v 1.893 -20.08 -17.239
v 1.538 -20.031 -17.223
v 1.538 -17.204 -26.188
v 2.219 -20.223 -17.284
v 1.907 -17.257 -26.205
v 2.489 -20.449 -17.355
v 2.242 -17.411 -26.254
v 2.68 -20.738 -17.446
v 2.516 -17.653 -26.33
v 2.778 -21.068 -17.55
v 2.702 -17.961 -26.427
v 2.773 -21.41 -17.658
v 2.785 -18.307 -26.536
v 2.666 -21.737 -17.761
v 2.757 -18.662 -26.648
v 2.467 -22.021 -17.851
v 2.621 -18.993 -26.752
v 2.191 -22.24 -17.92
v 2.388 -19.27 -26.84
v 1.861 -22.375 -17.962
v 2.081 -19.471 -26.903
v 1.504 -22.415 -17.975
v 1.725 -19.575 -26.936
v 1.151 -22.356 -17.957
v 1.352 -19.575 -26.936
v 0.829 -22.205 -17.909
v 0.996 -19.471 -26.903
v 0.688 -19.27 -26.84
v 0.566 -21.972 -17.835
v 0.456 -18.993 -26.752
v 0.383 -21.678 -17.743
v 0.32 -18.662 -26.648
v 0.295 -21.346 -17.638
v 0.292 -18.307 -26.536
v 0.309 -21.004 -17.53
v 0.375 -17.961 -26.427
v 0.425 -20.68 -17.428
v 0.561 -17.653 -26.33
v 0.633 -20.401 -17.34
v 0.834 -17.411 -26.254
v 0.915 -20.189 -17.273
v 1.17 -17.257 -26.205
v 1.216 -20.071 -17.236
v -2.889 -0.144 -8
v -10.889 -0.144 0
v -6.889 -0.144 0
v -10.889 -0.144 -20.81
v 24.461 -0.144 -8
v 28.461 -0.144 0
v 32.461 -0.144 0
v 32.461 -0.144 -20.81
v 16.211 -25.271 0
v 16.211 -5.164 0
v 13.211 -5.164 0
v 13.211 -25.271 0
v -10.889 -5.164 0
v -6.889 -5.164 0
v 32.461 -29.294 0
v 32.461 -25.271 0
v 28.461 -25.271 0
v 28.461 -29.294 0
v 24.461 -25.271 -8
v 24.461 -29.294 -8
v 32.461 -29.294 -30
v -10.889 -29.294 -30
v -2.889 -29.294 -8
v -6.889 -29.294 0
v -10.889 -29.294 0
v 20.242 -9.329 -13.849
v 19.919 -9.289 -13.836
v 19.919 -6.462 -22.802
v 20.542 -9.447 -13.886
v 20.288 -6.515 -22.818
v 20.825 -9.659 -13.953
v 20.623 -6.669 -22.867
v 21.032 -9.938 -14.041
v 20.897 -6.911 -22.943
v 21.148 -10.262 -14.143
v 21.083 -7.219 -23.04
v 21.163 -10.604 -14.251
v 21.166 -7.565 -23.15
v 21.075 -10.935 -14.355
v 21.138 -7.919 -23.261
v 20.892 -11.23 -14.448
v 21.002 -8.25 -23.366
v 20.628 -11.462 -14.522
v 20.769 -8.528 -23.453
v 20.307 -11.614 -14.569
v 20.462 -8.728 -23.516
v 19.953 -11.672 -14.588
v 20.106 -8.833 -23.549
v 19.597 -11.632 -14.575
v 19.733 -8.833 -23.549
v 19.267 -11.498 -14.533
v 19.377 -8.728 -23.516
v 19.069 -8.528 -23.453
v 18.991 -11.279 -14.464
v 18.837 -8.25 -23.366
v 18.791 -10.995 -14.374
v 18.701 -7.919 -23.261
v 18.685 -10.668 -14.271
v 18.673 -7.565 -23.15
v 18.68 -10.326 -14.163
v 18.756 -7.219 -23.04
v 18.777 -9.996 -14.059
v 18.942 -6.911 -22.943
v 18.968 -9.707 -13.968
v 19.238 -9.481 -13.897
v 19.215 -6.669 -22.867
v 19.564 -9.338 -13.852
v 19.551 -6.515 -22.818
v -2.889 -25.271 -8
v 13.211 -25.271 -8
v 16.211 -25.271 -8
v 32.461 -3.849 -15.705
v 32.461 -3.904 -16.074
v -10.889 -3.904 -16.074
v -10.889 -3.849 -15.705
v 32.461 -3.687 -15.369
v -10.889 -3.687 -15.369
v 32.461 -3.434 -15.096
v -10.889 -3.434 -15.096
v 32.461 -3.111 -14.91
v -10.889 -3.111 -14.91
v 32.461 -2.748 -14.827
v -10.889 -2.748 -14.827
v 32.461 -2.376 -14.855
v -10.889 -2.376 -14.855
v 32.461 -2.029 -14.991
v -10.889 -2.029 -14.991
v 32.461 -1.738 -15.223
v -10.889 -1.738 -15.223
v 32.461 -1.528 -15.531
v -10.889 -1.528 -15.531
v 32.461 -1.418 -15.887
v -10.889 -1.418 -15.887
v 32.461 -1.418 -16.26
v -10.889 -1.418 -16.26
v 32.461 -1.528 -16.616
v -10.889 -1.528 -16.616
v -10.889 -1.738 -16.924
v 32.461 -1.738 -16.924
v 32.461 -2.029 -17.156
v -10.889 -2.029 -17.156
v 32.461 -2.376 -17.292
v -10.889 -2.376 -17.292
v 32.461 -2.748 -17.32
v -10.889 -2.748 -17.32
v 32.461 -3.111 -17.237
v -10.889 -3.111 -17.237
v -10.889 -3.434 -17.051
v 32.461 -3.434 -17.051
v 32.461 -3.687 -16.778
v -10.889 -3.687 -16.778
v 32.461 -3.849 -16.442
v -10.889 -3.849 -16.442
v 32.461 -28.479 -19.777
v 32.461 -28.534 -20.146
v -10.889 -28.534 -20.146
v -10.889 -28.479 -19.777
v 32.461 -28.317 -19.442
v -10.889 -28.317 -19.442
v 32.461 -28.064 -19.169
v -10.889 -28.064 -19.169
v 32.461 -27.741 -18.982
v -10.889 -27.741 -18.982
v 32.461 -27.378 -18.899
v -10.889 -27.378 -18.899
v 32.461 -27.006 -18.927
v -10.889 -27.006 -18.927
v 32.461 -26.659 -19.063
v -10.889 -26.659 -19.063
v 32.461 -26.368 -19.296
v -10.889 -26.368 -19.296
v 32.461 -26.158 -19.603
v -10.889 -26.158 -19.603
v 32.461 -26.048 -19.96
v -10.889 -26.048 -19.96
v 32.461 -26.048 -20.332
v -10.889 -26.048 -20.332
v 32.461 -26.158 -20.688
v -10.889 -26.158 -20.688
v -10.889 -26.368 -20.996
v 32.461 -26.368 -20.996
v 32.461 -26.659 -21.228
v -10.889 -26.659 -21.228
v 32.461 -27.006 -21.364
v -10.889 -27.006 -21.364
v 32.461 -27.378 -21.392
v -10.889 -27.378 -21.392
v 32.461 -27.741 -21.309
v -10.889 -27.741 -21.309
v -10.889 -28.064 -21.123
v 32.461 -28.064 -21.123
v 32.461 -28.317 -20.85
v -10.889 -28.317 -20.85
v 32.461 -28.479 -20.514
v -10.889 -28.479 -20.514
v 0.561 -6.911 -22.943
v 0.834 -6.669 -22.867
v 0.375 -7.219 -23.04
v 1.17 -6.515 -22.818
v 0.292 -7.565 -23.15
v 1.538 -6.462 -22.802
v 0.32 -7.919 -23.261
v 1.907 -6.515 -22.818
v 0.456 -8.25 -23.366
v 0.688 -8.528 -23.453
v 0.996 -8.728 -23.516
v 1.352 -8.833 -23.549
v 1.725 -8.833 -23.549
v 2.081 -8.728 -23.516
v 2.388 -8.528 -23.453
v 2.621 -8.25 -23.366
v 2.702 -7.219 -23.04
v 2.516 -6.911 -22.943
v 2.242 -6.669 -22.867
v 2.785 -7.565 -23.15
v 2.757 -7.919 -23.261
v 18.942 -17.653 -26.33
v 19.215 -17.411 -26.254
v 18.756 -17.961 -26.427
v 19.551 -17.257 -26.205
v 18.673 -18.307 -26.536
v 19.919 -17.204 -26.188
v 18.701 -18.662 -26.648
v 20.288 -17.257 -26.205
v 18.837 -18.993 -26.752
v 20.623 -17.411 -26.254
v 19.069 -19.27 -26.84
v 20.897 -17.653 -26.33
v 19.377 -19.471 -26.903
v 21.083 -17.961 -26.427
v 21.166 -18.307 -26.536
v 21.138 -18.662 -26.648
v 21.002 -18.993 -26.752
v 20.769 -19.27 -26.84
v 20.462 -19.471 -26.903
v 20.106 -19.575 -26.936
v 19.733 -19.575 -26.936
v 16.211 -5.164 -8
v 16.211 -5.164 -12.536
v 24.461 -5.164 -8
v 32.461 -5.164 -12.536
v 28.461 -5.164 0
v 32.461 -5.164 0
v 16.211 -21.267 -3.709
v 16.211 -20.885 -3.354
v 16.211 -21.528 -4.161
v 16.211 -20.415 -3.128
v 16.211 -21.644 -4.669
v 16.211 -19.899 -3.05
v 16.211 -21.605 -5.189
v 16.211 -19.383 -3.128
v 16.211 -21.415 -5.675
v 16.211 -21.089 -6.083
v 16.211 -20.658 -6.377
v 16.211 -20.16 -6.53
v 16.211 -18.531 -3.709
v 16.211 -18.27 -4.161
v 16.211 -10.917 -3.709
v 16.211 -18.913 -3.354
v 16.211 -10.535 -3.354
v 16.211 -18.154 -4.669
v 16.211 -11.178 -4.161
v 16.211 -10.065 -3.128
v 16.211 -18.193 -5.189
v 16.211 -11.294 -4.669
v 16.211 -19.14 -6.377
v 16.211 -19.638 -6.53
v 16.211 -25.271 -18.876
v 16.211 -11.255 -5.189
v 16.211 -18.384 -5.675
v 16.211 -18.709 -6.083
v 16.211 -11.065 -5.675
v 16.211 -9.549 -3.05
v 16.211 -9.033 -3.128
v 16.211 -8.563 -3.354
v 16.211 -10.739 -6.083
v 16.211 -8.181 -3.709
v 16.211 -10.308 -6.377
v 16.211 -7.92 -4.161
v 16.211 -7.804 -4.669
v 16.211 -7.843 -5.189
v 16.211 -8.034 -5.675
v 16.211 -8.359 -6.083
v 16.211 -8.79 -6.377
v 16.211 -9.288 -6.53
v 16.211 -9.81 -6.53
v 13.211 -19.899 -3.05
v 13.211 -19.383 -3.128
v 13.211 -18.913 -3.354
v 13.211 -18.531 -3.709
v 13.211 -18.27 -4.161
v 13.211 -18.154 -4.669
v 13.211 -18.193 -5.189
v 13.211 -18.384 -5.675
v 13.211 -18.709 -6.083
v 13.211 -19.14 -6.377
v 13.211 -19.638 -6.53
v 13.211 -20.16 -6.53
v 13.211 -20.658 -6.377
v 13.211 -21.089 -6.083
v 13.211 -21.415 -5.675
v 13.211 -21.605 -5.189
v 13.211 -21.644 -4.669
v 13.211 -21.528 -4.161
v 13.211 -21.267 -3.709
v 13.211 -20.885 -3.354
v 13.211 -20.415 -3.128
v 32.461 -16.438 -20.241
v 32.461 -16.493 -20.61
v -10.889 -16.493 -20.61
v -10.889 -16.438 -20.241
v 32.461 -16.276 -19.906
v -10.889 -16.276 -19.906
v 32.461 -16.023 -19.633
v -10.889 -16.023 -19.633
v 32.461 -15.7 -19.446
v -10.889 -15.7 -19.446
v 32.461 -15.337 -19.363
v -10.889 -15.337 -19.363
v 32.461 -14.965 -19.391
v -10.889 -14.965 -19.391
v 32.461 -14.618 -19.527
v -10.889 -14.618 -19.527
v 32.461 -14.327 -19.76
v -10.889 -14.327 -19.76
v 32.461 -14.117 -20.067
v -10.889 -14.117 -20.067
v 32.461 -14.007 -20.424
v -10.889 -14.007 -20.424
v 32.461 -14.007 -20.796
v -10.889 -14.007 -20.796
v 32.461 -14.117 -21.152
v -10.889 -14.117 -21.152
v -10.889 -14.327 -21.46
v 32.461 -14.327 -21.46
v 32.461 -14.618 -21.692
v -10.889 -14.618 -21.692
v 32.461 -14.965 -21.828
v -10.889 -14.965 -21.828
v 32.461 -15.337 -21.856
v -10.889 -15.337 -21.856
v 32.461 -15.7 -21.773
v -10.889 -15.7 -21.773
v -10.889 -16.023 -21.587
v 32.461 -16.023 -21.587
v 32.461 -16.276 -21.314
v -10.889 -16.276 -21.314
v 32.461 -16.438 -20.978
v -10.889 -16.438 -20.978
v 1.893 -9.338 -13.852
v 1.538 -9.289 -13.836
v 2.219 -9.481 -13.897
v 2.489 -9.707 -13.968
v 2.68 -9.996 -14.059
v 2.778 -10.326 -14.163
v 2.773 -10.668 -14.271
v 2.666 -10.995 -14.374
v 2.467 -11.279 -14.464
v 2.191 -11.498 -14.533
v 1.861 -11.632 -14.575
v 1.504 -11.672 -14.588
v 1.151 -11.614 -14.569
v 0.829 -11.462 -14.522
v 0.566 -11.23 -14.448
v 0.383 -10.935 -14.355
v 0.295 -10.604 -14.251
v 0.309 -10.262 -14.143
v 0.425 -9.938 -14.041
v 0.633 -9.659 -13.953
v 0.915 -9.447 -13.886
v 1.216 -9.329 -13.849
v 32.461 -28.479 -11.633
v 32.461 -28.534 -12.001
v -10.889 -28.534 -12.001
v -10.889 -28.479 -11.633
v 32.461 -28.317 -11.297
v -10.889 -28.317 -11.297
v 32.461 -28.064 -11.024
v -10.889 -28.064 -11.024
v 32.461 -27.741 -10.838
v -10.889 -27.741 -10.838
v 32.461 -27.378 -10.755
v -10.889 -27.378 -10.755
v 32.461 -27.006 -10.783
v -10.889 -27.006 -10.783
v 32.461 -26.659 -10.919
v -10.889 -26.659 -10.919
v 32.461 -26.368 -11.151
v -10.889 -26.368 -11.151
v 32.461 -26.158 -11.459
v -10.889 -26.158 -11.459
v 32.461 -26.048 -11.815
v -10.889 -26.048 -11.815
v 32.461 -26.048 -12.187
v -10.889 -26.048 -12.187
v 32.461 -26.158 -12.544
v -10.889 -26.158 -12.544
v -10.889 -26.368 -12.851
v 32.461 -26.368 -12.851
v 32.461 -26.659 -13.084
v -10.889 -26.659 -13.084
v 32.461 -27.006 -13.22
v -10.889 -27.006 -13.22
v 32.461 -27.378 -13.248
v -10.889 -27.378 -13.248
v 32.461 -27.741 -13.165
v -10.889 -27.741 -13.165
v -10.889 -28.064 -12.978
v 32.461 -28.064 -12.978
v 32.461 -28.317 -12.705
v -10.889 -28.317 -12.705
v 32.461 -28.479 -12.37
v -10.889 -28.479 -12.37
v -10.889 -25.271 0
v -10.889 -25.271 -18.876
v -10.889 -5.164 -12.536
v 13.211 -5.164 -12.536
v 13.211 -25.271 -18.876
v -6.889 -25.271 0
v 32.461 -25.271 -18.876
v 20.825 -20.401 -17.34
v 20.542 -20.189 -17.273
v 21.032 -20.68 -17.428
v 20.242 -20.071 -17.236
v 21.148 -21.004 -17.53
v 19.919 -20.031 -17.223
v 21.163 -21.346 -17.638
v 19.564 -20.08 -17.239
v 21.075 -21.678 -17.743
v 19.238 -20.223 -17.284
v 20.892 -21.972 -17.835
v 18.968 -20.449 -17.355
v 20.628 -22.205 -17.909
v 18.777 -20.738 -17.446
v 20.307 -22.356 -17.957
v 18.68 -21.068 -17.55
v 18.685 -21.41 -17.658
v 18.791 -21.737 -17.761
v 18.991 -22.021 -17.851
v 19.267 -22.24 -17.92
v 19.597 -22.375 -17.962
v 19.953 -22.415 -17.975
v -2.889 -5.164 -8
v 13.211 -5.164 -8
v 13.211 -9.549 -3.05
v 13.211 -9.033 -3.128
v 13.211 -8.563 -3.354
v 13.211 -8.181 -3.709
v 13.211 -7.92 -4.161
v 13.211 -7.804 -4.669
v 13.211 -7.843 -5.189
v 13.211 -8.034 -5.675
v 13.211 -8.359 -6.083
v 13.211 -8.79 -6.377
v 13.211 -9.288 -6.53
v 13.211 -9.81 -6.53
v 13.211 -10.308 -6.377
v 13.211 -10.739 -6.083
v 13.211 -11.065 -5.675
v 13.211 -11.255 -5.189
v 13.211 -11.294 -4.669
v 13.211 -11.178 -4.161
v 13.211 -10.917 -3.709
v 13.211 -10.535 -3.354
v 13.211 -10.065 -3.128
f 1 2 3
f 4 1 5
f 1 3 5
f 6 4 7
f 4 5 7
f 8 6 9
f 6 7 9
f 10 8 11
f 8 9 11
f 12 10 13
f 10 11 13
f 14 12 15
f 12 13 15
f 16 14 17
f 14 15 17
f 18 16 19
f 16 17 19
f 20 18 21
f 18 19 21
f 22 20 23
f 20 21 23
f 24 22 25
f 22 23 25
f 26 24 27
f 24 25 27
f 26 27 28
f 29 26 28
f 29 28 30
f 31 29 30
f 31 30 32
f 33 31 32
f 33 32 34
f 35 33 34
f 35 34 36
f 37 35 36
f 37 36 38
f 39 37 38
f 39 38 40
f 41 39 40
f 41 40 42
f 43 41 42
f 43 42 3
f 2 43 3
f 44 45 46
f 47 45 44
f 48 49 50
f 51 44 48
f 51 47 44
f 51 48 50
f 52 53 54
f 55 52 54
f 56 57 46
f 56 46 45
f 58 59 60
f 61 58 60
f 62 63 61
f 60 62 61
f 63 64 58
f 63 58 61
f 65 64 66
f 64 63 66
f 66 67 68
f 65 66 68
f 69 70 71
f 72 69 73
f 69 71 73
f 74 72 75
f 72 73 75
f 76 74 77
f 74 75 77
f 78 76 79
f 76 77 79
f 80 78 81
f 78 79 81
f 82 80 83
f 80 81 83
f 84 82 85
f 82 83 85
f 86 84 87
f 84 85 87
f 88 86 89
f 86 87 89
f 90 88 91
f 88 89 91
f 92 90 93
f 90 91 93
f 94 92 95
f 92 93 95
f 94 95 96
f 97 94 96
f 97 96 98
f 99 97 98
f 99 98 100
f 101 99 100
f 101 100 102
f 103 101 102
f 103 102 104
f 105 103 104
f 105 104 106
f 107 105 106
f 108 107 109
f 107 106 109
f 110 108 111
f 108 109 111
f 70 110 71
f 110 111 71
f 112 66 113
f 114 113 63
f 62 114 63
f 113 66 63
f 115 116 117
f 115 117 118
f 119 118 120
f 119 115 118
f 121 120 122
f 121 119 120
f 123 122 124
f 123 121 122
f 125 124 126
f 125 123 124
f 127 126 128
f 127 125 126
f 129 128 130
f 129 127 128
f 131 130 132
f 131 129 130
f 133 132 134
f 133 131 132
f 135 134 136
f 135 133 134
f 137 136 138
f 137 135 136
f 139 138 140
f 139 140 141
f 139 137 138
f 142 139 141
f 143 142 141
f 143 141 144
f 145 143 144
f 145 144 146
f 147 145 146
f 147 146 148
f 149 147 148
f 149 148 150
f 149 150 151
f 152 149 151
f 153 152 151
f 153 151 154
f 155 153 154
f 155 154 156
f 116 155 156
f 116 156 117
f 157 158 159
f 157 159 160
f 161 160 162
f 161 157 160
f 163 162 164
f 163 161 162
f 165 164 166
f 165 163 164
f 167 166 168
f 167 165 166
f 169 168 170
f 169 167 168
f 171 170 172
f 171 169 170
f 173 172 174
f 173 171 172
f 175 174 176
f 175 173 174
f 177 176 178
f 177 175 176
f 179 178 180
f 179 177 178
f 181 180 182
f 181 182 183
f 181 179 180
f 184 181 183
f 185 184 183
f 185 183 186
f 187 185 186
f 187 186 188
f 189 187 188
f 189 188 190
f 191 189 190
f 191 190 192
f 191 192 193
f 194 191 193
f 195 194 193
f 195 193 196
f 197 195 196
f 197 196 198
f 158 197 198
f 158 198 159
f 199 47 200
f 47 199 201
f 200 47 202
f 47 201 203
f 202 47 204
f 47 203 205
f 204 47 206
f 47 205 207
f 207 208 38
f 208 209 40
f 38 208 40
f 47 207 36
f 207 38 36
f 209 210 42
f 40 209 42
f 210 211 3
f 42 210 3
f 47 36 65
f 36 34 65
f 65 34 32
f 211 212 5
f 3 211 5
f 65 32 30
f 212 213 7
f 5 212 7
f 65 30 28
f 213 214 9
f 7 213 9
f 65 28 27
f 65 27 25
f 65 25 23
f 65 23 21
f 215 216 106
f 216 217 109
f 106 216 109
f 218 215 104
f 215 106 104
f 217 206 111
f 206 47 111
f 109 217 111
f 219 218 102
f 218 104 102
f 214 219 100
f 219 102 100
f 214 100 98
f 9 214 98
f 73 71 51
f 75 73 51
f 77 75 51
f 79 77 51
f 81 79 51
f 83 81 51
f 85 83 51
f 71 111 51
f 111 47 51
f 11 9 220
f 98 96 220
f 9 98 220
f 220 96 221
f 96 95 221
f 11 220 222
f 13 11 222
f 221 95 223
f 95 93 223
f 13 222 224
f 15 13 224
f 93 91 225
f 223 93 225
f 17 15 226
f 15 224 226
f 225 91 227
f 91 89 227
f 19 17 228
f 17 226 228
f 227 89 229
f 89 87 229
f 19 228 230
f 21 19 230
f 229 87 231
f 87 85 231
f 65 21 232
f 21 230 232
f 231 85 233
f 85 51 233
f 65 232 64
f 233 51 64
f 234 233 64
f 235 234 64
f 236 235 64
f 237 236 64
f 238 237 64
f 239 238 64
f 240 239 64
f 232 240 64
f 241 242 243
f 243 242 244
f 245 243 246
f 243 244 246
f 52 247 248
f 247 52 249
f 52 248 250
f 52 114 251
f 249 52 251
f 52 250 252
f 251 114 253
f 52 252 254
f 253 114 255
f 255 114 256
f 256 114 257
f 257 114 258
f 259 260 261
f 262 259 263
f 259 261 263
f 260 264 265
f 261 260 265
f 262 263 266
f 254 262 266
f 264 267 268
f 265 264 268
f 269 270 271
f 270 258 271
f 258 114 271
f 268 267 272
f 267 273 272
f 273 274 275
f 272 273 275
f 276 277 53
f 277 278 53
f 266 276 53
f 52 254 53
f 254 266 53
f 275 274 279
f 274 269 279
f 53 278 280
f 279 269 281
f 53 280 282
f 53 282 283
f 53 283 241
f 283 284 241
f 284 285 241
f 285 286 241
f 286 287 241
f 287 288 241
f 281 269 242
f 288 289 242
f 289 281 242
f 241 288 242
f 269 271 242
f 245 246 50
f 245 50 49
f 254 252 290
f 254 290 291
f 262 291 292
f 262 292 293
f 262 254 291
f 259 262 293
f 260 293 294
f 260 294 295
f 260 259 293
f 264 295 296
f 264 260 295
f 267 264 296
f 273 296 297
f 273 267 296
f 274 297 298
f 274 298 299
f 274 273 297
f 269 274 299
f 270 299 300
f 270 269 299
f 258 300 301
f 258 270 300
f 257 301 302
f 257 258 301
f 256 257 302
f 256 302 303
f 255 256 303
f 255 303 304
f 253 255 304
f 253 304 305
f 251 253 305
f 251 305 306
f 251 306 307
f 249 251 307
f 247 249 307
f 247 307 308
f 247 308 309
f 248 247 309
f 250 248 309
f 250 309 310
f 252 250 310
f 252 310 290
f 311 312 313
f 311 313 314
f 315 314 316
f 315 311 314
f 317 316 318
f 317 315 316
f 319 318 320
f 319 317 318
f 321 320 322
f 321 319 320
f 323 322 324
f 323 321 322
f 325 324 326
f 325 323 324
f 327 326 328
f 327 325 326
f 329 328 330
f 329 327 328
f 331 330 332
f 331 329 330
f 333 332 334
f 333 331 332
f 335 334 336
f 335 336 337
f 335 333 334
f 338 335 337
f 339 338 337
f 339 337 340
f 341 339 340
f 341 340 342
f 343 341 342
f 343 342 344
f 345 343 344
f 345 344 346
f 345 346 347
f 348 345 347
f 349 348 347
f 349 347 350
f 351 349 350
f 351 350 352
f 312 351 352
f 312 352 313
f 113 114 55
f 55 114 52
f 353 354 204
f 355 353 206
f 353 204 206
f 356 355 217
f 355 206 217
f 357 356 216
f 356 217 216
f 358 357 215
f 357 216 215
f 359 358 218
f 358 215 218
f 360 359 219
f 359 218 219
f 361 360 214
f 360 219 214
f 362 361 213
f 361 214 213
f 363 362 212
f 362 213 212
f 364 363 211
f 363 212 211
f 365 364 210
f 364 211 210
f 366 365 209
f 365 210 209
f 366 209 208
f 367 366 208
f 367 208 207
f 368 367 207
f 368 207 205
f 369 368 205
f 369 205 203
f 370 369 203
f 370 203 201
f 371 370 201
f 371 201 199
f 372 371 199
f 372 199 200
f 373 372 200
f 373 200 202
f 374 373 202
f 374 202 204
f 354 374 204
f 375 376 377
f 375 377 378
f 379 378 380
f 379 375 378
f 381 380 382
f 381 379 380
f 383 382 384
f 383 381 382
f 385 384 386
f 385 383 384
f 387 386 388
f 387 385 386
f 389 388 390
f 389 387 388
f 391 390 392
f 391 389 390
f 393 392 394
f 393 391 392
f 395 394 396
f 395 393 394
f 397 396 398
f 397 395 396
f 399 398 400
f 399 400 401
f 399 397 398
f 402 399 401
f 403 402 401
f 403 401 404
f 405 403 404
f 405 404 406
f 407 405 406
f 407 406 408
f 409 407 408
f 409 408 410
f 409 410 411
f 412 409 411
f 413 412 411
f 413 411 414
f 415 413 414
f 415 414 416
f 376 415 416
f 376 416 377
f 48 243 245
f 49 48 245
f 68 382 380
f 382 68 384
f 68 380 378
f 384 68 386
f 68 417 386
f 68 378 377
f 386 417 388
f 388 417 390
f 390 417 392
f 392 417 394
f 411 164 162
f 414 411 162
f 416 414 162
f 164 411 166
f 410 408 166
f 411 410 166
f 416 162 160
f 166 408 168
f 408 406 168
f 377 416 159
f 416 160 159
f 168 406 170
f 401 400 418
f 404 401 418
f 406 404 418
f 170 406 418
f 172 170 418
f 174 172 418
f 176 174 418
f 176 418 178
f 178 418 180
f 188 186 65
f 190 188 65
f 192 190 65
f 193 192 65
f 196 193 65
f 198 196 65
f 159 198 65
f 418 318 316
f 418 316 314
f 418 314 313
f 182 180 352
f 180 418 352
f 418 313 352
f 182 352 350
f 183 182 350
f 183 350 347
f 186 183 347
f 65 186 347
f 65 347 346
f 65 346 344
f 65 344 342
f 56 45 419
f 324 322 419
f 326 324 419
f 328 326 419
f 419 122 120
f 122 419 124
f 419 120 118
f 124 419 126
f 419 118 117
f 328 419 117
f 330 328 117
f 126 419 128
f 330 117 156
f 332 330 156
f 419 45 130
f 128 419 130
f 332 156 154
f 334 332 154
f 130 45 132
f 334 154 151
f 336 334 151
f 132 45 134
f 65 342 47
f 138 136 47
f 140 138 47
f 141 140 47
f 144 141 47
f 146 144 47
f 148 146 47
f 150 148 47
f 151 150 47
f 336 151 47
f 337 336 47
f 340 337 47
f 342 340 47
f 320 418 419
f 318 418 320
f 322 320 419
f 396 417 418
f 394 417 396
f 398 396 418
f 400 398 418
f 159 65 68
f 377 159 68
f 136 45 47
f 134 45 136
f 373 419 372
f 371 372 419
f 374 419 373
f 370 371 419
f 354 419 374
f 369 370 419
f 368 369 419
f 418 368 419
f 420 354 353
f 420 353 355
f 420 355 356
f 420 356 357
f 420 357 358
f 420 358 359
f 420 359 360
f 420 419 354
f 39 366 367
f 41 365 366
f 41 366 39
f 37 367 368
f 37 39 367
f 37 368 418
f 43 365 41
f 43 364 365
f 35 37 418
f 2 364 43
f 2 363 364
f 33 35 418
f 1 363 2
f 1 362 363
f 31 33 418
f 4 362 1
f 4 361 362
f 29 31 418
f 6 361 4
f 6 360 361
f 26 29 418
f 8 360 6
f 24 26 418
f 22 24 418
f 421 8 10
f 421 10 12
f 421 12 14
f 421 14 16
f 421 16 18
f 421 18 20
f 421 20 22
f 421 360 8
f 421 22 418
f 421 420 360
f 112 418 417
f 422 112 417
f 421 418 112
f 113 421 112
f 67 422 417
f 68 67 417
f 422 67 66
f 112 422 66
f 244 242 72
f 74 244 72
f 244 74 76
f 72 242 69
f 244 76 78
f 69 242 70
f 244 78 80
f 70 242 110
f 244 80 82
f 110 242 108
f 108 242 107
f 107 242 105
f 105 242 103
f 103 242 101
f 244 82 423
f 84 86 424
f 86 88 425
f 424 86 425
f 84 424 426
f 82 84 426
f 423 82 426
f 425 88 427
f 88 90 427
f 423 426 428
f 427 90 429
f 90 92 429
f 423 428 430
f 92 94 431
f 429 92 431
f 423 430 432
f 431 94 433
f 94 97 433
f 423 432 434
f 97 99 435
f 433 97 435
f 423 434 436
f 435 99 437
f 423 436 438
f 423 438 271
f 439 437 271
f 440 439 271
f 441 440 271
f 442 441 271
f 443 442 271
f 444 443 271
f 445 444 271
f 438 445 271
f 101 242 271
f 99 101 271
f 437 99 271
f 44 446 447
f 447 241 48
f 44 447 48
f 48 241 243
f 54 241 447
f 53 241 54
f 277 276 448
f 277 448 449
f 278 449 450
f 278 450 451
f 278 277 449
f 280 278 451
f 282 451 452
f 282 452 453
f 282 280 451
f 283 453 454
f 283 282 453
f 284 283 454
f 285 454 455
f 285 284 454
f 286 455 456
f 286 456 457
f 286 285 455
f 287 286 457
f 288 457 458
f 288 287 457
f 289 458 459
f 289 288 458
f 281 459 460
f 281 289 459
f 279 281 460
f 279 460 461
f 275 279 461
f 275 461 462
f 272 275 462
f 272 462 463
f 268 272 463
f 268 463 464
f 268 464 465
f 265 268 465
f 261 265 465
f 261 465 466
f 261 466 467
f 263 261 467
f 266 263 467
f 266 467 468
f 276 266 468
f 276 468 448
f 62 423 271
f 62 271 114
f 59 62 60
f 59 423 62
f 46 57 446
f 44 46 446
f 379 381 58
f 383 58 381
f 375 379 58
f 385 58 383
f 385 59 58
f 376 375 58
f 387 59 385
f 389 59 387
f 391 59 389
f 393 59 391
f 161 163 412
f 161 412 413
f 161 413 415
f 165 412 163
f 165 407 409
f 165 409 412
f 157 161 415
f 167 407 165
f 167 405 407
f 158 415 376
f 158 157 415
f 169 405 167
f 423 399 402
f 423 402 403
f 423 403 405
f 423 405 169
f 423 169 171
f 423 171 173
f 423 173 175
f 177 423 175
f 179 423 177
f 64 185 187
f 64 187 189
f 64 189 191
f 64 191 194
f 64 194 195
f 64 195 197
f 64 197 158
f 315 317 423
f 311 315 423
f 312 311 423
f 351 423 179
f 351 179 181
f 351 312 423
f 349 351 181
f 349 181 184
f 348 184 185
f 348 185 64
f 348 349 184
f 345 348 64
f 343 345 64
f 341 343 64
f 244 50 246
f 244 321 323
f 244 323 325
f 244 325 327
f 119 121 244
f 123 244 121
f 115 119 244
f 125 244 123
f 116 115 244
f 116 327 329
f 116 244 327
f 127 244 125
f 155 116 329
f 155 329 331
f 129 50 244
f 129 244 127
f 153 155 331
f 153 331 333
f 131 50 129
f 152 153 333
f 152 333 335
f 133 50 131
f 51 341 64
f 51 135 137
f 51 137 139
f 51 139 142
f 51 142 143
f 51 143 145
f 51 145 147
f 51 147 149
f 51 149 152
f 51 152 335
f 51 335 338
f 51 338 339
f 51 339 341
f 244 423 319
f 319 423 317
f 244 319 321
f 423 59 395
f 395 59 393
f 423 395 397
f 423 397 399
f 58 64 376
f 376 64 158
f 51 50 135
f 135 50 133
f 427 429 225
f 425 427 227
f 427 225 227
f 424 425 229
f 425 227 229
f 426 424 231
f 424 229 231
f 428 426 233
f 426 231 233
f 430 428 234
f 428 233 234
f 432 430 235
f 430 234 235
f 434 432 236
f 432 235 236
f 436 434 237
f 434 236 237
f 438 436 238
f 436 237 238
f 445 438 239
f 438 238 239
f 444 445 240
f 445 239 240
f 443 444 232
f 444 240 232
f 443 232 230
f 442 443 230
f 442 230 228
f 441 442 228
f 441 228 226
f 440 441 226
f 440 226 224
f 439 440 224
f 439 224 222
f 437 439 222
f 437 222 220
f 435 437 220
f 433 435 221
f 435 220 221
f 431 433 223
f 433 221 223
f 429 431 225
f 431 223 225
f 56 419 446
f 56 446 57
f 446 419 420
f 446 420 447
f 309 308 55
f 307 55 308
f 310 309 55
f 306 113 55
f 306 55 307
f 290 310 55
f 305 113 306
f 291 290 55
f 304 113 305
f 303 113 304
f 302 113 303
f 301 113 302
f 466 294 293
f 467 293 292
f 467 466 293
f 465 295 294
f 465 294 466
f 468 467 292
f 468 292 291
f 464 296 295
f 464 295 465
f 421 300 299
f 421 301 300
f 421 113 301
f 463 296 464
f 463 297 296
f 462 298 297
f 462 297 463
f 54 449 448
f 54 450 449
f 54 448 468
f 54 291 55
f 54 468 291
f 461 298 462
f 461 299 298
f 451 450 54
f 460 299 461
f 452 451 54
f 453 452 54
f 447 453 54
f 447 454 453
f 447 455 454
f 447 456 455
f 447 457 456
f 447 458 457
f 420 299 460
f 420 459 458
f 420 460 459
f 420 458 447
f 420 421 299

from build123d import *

# Parameters (mm, degrees)
SKETCH1_W            = 43.35
SKETCH1_H            = 29.15
BOSS_EXTRUDE1_DEPTH  = 30
CUT_EXTRUDE6_DEPTH   = 28.13
SKETCH11_W           = 18.87556933
SKETCH11_H           = 20.106349468
CUT_EXTRUDE8_DEPTH   = 50
SKETCH14_W           = 3
SKETCH14_H           = 29.15
BOSS_EXTRUDE5_DEPTH  = 30
SKETCH15_W           = 8
SKETCH15_H           = 4.023650532
CUT_EXTRUDE10_DEPTH  = 5
SKETCH16_W           = 8
SKETCH16_H           = 4
CUT_EXTRUDE11_DEPTH  = 5
SKETCH17_R           = 1.75
CUT_EXTRUDE12_DEPTH  = 5
CUT_EXTRUDE14_DEPTH  = 50
SKETCH30_R           = 1.25
CUT_EXTRUDE23_DEPTH  = 45
SKETCH31_R           = 1.25
CUT_EXTRUDE24_DEPTH  = 50
SKETCH32_R           = 1.25
CUT_EXTRUDE25_DEPTH  = 50
CUT_EXTRUDE29_DEPTH  = 5
BOSS_EXTRUDE13_DEPTH = 24.1
BOSS_EXTRUDE14_DEPTH = 16.25
SKETCH74_R           = 1.250000003
CUT_EXTRUDE30_DEPTH  = 10


with BuildPart() as part:
    # Sketch1 → Boss-Extrude1 (new body)
    with BuildSketch(Plane.XY):
        with Locations((-32.56399028, -14.719171637)):
            Rectangle(SKETCH1_W, SKETCH1_H)
    extrude(amount=-BOSS_EXTRUDE1_DEPTH)

    # Sketch9 → Cut-Extrude6 (cut)
    with BuildSketch(Plane.XZ.offset(29.294171637)):
        Polygon((-14.88899028, 0), (-18.88899028, -8), (-46.23899028, -8), (-50.23899028, 0), align=None)
    extrude(amount=-CUT_EXTRUDE6_DEPTH, mode=Mode.SUBTRACT)

    # Sketch11 → Cut-Extrude8 (cut)
    with BuildSketch(Plane.ZY.offset(54.23899028)):
        with Locations((-9.437784665, -15.217346371)):
            Rectangle(SKETCH11_W, SKETCH11_H)
    extrude(amount=-CUT_EXTRUDE8_DEPTH, mode=Mode.SUBTRACT)

    # Sketch14 → Boss-Extrude5 (add)
    with BuildSketch(Plane(origin=(0, 0, -30), x_dir=(-1, 0, 0), z_dir=(0, 0, -1))):
        with Locations((36.48899028, -14.719171637)):
            Rectangle(SKETCH14_W, SKETCH14_H)
    extrude(amount=-BOSS_EXTRUDE5_DEPTH)

    # Sketch15 → Cut-Extrude10 (cut)
    with BuildSketch(Plane.ZY.offset(37.98899028)):
        with Locations((-4, -27.282346371)):
            Rectangle(SKETCH15_W, SKETCH15_H)
    extrude(amount=-CUT_EXTRUDE10_DEPTH, mode=Mode.SUBTRACT)

    # Sketch16 → Cut-Extrude11 (cut)
    with BuildSketch(Plane.ZY.offset(37.98899028)):
        with Locations((-4, -3.164171637)):
            Rectangle(SKETCH16_W, SKETCH16_H)
    extrude(amount=-CUT_EXTRUDE11_DEPTH, mode=Mode.SUBTRACT)

    # Sketch17 → Cut-Extrude12 (cut)
    with BuildSketch(Plane.ZY.offset(37.98899028)):
        with Locations((-4.799999988, -19.899171637)):
            Circle(SKETCH17_R)
        with Locations((-4.799999989, -9.549171637)):
            Circle(SKETCH17_R)
    extrude(amount=-CUT_EXTRUDE12_DEPTH, mode=Mode.SUBTRACT)

    # Sketch20 → Cut-Extrude14 (cut)
    with BuildSketch(Plane.ZY.offset(54.23899028)):
        Polygon((-30, -29.294171637), (-30, -0.144171637), (-20.81, -0.144171637), align=None)
    extrude(amount=-CUT_EXTRUDE14_DEPTH, mode=Mode.SUBTRACT)

    # Sketch30 → Cut-Extrude23 (cut)
    with BuildSketch(Plane.ZY.offset(54.23899028)):
        with Locations(Location((-12.001192799, -27.284171637, 0), (0, 0, 270))):
            Circle(SKETCH30_R)
        with Locations(Location((-20.145814089, -27.284171637, 0), (0, 0, 270))):
            Circle(SKETCH30_R)
    extrude(amount=-CUT_EXTRUDE23_DEPTH, mode=Mode.SUBTRACT)

    # Sketch31 → Cut-Extrude24 (cut)
    with BuildSketch(Plane.ZY.offset(54.23899028)):
        with Locations(Location((-16.073503444, -2.654171637, 0), (0, 0, 270))):
            Circle(SKETCH31_R)
    extrude(amount=-CUT_EXTRUDE24_DEPTH, mode=Mode.SUBTRACT)

    # Sketch32 → Cut-Extrude25 (cut)
    with BuildSketch(Plane.ZY.offset(54.23899028)):
        with Locations(Location((-20.609812978, -15.243146641, 0), (0, 0, 270))):
            Circle(SKETCH32_R)
    extrude(amount=-CUT_EXTRUDE25_DEPTH, mode=Mode.SUBTRACT)

    # Sketch56 → Cut-Extrude29 (cut)
    with BuildSketch(Plane.XZ.offset(1.164171637)):
        Polygon((-14.88899028, 0), (-18.88899028, -8), (-46.23899028, -8), (-50.23899028, 0), align=None)
    extrude(amount=-CUT_EXTRUDE29_DEPTH, mode=Mode.SUBTRACT)

    # Sketch68 → Boss-Extrude13 (add)
    with BuildSketch(Plane(origin=(-34.98899028, 0, 0), x_dir=(0, 0, -1), z_dir=(1, 0, 0))):
        Polygon((18.87556933, -5.164171637), (12.53556933, -5.164171637), (18.87556933, -25.270521105), align=None)
    extrude(amount=BOSS_EXTRUDE13_DEPTH)

    # Sketch73 → Boss-Extrude14 (add)
    with BuildSketch(Plane.ZY.offset(37.98899028)):
        Polygon((-18.87556933, -5.164171637), (-12.53556933, -5.164171637), (-18.87556933, -25.270521105), align=None)
    extrude(amount=BOSS_EXTRUDE14_DEPTH)


with BuildPart() as body_2:
    # Mirror1: mirrored copy
    add(part.part.mirror(Plane(origin=(-10.88899028, -0.144171637, -30), x_dir=(0, 0, 1), z_dir=(1, 0, 0))))

    # Sketch74 → Cut-Extrude30 (cut)
    with BuildSketch(Plane(origin=(0, 5.954518238, -18.887291254), x_dir=(-1, 0, 0), z_dir=(0, 0.3006772394057975, -0.953725955242547))):
        with Locations(Location((-19.919214984, -25.5324432, 0), (0, 0, 90))):
            Circle(SKETCH74_R)
        with Locations(Location((-1.538214984, -25.532443188, 0), (0, 0, 90))):
            Circle(SKETCH74_R)
        with Locations(Location((-1.538214991, -14.26893462, 0), (0, 0, 90))):
            Circle(SKETCH74_R)
        with Locations(Location((-19.919214991, -14.268934632, 0), (0, 0, 90))):
            Circle(SKETCH74_R)
    extrude(amount=-CUT_EXTRUDE30_DEPTH, mode=Mode.SUBTRACT)


solid = body_2.part
